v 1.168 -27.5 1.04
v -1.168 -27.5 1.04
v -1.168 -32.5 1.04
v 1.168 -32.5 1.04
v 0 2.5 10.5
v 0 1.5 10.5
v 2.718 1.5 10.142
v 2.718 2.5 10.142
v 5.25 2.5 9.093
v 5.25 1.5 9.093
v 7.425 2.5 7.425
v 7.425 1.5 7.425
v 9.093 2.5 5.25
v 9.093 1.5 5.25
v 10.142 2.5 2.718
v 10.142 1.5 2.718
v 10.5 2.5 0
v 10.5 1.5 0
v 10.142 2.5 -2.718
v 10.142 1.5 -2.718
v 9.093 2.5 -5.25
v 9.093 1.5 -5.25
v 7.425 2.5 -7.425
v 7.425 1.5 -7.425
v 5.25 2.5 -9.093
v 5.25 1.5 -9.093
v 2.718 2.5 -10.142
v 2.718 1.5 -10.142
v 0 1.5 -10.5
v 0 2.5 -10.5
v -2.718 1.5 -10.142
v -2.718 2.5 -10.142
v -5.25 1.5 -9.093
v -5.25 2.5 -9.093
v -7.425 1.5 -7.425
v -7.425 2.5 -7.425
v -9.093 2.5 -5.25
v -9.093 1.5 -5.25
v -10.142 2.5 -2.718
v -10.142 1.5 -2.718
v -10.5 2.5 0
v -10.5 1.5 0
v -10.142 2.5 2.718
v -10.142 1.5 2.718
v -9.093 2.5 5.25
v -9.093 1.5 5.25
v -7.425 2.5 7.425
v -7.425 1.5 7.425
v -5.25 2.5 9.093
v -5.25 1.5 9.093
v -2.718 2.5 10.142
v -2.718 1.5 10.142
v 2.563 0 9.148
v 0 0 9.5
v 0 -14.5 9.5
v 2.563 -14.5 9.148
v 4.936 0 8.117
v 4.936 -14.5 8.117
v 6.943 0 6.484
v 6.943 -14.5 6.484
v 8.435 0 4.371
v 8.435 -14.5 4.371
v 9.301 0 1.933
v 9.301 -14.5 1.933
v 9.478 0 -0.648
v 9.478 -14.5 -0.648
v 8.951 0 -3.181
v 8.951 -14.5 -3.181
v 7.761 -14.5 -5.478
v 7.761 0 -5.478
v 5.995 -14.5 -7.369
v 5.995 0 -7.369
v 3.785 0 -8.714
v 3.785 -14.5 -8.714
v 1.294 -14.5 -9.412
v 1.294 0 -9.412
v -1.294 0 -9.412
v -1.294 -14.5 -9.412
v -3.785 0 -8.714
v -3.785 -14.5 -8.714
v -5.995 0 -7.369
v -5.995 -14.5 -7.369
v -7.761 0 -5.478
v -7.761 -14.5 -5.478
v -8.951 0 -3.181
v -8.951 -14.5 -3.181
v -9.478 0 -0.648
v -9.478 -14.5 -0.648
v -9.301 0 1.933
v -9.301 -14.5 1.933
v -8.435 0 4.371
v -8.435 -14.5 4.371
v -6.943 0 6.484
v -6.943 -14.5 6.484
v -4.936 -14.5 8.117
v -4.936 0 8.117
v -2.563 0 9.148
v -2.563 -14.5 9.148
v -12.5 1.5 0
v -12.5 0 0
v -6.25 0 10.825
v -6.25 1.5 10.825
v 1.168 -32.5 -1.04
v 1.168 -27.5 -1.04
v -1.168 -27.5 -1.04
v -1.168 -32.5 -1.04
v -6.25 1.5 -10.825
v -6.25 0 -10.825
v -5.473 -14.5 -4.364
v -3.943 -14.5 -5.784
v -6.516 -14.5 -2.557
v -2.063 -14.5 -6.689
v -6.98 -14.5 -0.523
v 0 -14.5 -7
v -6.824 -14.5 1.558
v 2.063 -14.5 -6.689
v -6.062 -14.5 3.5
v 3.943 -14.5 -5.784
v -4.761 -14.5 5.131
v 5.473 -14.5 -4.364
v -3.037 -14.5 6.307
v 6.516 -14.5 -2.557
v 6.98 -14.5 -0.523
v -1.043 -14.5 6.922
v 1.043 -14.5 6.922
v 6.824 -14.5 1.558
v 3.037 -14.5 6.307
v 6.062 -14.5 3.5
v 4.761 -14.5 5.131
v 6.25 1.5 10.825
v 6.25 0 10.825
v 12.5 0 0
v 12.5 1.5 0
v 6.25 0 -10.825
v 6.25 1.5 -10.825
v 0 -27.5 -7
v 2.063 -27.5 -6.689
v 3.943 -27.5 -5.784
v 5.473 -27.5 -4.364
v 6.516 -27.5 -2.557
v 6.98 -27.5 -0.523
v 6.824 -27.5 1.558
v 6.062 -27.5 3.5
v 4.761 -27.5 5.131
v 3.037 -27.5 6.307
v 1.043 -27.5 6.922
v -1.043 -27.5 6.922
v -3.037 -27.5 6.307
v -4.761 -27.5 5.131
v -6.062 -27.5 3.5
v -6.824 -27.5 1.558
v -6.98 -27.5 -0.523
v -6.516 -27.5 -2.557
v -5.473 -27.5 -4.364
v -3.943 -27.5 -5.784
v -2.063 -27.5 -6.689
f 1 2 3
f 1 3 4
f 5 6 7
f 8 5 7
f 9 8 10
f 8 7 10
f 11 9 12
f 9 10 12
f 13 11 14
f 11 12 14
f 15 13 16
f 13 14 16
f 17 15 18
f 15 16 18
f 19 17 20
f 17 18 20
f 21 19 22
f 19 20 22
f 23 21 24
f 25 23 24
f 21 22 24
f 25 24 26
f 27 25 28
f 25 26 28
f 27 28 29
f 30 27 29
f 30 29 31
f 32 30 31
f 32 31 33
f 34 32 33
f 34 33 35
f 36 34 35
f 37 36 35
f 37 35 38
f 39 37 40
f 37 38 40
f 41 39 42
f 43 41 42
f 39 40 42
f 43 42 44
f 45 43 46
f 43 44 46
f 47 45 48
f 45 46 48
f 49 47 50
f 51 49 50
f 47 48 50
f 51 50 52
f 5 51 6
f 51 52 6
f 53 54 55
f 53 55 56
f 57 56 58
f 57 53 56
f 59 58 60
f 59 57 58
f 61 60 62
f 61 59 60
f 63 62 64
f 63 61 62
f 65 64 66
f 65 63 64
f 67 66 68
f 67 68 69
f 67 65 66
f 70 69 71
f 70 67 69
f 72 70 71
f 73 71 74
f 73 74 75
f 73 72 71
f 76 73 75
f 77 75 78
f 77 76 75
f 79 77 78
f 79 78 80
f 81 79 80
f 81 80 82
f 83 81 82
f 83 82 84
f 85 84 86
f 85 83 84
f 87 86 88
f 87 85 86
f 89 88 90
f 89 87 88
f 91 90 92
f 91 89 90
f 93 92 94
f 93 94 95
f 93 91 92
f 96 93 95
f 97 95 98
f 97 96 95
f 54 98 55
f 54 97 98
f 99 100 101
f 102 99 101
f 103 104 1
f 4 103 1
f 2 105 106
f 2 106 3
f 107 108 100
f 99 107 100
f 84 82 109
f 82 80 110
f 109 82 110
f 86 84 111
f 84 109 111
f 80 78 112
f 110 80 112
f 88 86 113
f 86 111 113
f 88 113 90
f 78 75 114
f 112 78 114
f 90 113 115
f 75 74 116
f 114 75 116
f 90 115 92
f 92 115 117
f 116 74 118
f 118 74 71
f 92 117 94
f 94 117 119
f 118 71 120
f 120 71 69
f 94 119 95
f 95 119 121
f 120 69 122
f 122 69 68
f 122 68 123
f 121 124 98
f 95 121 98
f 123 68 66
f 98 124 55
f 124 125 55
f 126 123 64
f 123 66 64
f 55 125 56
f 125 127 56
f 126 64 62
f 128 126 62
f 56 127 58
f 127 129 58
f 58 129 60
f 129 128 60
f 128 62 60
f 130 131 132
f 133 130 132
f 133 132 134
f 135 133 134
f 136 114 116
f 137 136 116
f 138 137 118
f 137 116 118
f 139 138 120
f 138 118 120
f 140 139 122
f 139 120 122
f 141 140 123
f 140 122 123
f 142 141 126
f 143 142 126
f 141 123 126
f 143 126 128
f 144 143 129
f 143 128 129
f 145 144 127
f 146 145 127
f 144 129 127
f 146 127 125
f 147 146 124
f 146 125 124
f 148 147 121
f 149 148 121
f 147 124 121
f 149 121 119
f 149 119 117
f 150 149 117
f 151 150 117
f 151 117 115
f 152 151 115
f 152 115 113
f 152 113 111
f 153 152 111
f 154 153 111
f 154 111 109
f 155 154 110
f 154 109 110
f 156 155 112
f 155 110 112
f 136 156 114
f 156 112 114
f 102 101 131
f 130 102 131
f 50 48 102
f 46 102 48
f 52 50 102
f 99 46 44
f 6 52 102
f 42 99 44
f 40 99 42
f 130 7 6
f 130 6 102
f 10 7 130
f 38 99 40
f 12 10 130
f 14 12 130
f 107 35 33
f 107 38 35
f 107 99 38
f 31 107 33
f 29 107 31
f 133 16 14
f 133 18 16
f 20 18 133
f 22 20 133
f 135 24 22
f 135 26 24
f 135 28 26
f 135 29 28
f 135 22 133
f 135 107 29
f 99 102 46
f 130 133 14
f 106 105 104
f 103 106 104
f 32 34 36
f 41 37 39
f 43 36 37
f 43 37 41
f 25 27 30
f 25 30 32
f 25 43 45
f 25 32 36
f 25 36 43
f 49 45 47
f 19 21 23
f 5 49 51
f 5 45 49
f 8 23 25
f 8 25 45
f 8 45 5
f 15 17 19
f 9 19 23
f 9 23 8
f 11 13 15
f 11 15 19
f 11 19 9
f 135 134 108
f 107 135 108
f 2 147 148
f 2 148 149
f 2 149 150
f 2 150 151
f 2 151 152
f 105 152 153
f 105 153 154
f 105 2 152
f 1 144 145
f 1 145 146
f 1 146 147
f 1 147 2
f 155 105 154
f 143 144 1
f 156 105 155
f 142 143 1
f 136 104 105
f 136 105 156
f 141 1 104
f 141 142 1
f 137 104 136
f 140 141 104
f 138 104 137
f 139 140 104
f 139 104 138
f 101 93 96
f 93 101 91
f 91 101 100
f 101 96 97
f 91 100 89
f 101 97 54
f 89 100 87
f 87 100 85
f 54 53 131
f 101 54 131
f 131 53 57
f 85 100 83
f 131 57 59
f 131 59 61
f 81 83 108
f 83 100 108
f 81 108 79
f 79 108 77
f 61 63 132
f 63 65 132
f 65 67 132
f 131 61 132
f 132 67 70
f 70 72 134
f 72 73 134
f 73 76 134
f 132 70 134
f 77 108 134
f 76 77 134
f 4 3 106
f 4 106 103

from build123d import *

# Parameters (mm, degrees)
SKETCH1_R           = 9.5
BOSS_EXTRUDE1_DEPTH = 14.5
SKETCH2_R           = 7
BOSS_EXTRUDE2_DEPTH = 13
BOSS_EXTRUDE3_DEPTH = 1.5
SKETCH4_R           = 10.5
BOSS_EXTRUDE4_DEPTH = 1
SKETCH5_W           = 2.336545246
SKETCH5_H           = 2.080922042
BOSS_EXTRUDE5_DEPTH = 5


with BuildPart() as part:
    # Sketch1 → Boss-Extrude1 (new body)
    with BuildSketch(Plane(origin=(0, 0, 0), x_dir=(1, 0, 0), z_dir=(0, 1, 0))):
        with Locations(Location((0, 0, 0), (0, 0, 270))):
            Circle(SKETCH1_R)
    extrude(amount=-BOSS_EXTRUDE1_DEPTH)

    # Sketch2 → Boss-Extrude2 (add)
    with BuildSketch(Plane.XZ.offset(14.5)):
        with Locations(Location((0, 0, 0), (0, 0, 270))):
            Circle(SKETCH2_R)
    extrude(amount=BOSS_EXTRUDE2_DEPTH)

    # Sketch3 → Boss-Extrude3 (add)
    with BuildSketch(Plane(origin=(0, 0, 0), x_dir=(1, 0, 0), z_dir=(0, 1, 0))):
        Polygon((12.5, 0), (6.25, 10.825317547), (-6.25, 10.825317547), (-12.5, 0), (-6.25, -10.825317547), (6.25, -10.825317547), align=None)
    extrude(amount=BOSS_EXTRUDE3_DEPTH)

    # Sketch4 → Boss-Extrude4 (add)
    with BuildSketch(Plane(origin=(0, 1.5, 0), x_dir=(1, 0, 0), z_dir=(0, 1, 0))):
        with Locations(Location((0, 0, 0), (0, 0, 270))):
            Circle(SKETCH4_R)
    extrude(amount=BOSS_EXTRUDE4_DEPTH)

    # Sketch5 → Boss-Extrude5 (add)
    with BuildSketch(Plane.XZ.offset(27.5)):
        Rectangle(SKETCH5_W, SKETCH5_H)
    extrude(amount=BOSS_EXTRUDE5_DEPTH)


solid = part.part
